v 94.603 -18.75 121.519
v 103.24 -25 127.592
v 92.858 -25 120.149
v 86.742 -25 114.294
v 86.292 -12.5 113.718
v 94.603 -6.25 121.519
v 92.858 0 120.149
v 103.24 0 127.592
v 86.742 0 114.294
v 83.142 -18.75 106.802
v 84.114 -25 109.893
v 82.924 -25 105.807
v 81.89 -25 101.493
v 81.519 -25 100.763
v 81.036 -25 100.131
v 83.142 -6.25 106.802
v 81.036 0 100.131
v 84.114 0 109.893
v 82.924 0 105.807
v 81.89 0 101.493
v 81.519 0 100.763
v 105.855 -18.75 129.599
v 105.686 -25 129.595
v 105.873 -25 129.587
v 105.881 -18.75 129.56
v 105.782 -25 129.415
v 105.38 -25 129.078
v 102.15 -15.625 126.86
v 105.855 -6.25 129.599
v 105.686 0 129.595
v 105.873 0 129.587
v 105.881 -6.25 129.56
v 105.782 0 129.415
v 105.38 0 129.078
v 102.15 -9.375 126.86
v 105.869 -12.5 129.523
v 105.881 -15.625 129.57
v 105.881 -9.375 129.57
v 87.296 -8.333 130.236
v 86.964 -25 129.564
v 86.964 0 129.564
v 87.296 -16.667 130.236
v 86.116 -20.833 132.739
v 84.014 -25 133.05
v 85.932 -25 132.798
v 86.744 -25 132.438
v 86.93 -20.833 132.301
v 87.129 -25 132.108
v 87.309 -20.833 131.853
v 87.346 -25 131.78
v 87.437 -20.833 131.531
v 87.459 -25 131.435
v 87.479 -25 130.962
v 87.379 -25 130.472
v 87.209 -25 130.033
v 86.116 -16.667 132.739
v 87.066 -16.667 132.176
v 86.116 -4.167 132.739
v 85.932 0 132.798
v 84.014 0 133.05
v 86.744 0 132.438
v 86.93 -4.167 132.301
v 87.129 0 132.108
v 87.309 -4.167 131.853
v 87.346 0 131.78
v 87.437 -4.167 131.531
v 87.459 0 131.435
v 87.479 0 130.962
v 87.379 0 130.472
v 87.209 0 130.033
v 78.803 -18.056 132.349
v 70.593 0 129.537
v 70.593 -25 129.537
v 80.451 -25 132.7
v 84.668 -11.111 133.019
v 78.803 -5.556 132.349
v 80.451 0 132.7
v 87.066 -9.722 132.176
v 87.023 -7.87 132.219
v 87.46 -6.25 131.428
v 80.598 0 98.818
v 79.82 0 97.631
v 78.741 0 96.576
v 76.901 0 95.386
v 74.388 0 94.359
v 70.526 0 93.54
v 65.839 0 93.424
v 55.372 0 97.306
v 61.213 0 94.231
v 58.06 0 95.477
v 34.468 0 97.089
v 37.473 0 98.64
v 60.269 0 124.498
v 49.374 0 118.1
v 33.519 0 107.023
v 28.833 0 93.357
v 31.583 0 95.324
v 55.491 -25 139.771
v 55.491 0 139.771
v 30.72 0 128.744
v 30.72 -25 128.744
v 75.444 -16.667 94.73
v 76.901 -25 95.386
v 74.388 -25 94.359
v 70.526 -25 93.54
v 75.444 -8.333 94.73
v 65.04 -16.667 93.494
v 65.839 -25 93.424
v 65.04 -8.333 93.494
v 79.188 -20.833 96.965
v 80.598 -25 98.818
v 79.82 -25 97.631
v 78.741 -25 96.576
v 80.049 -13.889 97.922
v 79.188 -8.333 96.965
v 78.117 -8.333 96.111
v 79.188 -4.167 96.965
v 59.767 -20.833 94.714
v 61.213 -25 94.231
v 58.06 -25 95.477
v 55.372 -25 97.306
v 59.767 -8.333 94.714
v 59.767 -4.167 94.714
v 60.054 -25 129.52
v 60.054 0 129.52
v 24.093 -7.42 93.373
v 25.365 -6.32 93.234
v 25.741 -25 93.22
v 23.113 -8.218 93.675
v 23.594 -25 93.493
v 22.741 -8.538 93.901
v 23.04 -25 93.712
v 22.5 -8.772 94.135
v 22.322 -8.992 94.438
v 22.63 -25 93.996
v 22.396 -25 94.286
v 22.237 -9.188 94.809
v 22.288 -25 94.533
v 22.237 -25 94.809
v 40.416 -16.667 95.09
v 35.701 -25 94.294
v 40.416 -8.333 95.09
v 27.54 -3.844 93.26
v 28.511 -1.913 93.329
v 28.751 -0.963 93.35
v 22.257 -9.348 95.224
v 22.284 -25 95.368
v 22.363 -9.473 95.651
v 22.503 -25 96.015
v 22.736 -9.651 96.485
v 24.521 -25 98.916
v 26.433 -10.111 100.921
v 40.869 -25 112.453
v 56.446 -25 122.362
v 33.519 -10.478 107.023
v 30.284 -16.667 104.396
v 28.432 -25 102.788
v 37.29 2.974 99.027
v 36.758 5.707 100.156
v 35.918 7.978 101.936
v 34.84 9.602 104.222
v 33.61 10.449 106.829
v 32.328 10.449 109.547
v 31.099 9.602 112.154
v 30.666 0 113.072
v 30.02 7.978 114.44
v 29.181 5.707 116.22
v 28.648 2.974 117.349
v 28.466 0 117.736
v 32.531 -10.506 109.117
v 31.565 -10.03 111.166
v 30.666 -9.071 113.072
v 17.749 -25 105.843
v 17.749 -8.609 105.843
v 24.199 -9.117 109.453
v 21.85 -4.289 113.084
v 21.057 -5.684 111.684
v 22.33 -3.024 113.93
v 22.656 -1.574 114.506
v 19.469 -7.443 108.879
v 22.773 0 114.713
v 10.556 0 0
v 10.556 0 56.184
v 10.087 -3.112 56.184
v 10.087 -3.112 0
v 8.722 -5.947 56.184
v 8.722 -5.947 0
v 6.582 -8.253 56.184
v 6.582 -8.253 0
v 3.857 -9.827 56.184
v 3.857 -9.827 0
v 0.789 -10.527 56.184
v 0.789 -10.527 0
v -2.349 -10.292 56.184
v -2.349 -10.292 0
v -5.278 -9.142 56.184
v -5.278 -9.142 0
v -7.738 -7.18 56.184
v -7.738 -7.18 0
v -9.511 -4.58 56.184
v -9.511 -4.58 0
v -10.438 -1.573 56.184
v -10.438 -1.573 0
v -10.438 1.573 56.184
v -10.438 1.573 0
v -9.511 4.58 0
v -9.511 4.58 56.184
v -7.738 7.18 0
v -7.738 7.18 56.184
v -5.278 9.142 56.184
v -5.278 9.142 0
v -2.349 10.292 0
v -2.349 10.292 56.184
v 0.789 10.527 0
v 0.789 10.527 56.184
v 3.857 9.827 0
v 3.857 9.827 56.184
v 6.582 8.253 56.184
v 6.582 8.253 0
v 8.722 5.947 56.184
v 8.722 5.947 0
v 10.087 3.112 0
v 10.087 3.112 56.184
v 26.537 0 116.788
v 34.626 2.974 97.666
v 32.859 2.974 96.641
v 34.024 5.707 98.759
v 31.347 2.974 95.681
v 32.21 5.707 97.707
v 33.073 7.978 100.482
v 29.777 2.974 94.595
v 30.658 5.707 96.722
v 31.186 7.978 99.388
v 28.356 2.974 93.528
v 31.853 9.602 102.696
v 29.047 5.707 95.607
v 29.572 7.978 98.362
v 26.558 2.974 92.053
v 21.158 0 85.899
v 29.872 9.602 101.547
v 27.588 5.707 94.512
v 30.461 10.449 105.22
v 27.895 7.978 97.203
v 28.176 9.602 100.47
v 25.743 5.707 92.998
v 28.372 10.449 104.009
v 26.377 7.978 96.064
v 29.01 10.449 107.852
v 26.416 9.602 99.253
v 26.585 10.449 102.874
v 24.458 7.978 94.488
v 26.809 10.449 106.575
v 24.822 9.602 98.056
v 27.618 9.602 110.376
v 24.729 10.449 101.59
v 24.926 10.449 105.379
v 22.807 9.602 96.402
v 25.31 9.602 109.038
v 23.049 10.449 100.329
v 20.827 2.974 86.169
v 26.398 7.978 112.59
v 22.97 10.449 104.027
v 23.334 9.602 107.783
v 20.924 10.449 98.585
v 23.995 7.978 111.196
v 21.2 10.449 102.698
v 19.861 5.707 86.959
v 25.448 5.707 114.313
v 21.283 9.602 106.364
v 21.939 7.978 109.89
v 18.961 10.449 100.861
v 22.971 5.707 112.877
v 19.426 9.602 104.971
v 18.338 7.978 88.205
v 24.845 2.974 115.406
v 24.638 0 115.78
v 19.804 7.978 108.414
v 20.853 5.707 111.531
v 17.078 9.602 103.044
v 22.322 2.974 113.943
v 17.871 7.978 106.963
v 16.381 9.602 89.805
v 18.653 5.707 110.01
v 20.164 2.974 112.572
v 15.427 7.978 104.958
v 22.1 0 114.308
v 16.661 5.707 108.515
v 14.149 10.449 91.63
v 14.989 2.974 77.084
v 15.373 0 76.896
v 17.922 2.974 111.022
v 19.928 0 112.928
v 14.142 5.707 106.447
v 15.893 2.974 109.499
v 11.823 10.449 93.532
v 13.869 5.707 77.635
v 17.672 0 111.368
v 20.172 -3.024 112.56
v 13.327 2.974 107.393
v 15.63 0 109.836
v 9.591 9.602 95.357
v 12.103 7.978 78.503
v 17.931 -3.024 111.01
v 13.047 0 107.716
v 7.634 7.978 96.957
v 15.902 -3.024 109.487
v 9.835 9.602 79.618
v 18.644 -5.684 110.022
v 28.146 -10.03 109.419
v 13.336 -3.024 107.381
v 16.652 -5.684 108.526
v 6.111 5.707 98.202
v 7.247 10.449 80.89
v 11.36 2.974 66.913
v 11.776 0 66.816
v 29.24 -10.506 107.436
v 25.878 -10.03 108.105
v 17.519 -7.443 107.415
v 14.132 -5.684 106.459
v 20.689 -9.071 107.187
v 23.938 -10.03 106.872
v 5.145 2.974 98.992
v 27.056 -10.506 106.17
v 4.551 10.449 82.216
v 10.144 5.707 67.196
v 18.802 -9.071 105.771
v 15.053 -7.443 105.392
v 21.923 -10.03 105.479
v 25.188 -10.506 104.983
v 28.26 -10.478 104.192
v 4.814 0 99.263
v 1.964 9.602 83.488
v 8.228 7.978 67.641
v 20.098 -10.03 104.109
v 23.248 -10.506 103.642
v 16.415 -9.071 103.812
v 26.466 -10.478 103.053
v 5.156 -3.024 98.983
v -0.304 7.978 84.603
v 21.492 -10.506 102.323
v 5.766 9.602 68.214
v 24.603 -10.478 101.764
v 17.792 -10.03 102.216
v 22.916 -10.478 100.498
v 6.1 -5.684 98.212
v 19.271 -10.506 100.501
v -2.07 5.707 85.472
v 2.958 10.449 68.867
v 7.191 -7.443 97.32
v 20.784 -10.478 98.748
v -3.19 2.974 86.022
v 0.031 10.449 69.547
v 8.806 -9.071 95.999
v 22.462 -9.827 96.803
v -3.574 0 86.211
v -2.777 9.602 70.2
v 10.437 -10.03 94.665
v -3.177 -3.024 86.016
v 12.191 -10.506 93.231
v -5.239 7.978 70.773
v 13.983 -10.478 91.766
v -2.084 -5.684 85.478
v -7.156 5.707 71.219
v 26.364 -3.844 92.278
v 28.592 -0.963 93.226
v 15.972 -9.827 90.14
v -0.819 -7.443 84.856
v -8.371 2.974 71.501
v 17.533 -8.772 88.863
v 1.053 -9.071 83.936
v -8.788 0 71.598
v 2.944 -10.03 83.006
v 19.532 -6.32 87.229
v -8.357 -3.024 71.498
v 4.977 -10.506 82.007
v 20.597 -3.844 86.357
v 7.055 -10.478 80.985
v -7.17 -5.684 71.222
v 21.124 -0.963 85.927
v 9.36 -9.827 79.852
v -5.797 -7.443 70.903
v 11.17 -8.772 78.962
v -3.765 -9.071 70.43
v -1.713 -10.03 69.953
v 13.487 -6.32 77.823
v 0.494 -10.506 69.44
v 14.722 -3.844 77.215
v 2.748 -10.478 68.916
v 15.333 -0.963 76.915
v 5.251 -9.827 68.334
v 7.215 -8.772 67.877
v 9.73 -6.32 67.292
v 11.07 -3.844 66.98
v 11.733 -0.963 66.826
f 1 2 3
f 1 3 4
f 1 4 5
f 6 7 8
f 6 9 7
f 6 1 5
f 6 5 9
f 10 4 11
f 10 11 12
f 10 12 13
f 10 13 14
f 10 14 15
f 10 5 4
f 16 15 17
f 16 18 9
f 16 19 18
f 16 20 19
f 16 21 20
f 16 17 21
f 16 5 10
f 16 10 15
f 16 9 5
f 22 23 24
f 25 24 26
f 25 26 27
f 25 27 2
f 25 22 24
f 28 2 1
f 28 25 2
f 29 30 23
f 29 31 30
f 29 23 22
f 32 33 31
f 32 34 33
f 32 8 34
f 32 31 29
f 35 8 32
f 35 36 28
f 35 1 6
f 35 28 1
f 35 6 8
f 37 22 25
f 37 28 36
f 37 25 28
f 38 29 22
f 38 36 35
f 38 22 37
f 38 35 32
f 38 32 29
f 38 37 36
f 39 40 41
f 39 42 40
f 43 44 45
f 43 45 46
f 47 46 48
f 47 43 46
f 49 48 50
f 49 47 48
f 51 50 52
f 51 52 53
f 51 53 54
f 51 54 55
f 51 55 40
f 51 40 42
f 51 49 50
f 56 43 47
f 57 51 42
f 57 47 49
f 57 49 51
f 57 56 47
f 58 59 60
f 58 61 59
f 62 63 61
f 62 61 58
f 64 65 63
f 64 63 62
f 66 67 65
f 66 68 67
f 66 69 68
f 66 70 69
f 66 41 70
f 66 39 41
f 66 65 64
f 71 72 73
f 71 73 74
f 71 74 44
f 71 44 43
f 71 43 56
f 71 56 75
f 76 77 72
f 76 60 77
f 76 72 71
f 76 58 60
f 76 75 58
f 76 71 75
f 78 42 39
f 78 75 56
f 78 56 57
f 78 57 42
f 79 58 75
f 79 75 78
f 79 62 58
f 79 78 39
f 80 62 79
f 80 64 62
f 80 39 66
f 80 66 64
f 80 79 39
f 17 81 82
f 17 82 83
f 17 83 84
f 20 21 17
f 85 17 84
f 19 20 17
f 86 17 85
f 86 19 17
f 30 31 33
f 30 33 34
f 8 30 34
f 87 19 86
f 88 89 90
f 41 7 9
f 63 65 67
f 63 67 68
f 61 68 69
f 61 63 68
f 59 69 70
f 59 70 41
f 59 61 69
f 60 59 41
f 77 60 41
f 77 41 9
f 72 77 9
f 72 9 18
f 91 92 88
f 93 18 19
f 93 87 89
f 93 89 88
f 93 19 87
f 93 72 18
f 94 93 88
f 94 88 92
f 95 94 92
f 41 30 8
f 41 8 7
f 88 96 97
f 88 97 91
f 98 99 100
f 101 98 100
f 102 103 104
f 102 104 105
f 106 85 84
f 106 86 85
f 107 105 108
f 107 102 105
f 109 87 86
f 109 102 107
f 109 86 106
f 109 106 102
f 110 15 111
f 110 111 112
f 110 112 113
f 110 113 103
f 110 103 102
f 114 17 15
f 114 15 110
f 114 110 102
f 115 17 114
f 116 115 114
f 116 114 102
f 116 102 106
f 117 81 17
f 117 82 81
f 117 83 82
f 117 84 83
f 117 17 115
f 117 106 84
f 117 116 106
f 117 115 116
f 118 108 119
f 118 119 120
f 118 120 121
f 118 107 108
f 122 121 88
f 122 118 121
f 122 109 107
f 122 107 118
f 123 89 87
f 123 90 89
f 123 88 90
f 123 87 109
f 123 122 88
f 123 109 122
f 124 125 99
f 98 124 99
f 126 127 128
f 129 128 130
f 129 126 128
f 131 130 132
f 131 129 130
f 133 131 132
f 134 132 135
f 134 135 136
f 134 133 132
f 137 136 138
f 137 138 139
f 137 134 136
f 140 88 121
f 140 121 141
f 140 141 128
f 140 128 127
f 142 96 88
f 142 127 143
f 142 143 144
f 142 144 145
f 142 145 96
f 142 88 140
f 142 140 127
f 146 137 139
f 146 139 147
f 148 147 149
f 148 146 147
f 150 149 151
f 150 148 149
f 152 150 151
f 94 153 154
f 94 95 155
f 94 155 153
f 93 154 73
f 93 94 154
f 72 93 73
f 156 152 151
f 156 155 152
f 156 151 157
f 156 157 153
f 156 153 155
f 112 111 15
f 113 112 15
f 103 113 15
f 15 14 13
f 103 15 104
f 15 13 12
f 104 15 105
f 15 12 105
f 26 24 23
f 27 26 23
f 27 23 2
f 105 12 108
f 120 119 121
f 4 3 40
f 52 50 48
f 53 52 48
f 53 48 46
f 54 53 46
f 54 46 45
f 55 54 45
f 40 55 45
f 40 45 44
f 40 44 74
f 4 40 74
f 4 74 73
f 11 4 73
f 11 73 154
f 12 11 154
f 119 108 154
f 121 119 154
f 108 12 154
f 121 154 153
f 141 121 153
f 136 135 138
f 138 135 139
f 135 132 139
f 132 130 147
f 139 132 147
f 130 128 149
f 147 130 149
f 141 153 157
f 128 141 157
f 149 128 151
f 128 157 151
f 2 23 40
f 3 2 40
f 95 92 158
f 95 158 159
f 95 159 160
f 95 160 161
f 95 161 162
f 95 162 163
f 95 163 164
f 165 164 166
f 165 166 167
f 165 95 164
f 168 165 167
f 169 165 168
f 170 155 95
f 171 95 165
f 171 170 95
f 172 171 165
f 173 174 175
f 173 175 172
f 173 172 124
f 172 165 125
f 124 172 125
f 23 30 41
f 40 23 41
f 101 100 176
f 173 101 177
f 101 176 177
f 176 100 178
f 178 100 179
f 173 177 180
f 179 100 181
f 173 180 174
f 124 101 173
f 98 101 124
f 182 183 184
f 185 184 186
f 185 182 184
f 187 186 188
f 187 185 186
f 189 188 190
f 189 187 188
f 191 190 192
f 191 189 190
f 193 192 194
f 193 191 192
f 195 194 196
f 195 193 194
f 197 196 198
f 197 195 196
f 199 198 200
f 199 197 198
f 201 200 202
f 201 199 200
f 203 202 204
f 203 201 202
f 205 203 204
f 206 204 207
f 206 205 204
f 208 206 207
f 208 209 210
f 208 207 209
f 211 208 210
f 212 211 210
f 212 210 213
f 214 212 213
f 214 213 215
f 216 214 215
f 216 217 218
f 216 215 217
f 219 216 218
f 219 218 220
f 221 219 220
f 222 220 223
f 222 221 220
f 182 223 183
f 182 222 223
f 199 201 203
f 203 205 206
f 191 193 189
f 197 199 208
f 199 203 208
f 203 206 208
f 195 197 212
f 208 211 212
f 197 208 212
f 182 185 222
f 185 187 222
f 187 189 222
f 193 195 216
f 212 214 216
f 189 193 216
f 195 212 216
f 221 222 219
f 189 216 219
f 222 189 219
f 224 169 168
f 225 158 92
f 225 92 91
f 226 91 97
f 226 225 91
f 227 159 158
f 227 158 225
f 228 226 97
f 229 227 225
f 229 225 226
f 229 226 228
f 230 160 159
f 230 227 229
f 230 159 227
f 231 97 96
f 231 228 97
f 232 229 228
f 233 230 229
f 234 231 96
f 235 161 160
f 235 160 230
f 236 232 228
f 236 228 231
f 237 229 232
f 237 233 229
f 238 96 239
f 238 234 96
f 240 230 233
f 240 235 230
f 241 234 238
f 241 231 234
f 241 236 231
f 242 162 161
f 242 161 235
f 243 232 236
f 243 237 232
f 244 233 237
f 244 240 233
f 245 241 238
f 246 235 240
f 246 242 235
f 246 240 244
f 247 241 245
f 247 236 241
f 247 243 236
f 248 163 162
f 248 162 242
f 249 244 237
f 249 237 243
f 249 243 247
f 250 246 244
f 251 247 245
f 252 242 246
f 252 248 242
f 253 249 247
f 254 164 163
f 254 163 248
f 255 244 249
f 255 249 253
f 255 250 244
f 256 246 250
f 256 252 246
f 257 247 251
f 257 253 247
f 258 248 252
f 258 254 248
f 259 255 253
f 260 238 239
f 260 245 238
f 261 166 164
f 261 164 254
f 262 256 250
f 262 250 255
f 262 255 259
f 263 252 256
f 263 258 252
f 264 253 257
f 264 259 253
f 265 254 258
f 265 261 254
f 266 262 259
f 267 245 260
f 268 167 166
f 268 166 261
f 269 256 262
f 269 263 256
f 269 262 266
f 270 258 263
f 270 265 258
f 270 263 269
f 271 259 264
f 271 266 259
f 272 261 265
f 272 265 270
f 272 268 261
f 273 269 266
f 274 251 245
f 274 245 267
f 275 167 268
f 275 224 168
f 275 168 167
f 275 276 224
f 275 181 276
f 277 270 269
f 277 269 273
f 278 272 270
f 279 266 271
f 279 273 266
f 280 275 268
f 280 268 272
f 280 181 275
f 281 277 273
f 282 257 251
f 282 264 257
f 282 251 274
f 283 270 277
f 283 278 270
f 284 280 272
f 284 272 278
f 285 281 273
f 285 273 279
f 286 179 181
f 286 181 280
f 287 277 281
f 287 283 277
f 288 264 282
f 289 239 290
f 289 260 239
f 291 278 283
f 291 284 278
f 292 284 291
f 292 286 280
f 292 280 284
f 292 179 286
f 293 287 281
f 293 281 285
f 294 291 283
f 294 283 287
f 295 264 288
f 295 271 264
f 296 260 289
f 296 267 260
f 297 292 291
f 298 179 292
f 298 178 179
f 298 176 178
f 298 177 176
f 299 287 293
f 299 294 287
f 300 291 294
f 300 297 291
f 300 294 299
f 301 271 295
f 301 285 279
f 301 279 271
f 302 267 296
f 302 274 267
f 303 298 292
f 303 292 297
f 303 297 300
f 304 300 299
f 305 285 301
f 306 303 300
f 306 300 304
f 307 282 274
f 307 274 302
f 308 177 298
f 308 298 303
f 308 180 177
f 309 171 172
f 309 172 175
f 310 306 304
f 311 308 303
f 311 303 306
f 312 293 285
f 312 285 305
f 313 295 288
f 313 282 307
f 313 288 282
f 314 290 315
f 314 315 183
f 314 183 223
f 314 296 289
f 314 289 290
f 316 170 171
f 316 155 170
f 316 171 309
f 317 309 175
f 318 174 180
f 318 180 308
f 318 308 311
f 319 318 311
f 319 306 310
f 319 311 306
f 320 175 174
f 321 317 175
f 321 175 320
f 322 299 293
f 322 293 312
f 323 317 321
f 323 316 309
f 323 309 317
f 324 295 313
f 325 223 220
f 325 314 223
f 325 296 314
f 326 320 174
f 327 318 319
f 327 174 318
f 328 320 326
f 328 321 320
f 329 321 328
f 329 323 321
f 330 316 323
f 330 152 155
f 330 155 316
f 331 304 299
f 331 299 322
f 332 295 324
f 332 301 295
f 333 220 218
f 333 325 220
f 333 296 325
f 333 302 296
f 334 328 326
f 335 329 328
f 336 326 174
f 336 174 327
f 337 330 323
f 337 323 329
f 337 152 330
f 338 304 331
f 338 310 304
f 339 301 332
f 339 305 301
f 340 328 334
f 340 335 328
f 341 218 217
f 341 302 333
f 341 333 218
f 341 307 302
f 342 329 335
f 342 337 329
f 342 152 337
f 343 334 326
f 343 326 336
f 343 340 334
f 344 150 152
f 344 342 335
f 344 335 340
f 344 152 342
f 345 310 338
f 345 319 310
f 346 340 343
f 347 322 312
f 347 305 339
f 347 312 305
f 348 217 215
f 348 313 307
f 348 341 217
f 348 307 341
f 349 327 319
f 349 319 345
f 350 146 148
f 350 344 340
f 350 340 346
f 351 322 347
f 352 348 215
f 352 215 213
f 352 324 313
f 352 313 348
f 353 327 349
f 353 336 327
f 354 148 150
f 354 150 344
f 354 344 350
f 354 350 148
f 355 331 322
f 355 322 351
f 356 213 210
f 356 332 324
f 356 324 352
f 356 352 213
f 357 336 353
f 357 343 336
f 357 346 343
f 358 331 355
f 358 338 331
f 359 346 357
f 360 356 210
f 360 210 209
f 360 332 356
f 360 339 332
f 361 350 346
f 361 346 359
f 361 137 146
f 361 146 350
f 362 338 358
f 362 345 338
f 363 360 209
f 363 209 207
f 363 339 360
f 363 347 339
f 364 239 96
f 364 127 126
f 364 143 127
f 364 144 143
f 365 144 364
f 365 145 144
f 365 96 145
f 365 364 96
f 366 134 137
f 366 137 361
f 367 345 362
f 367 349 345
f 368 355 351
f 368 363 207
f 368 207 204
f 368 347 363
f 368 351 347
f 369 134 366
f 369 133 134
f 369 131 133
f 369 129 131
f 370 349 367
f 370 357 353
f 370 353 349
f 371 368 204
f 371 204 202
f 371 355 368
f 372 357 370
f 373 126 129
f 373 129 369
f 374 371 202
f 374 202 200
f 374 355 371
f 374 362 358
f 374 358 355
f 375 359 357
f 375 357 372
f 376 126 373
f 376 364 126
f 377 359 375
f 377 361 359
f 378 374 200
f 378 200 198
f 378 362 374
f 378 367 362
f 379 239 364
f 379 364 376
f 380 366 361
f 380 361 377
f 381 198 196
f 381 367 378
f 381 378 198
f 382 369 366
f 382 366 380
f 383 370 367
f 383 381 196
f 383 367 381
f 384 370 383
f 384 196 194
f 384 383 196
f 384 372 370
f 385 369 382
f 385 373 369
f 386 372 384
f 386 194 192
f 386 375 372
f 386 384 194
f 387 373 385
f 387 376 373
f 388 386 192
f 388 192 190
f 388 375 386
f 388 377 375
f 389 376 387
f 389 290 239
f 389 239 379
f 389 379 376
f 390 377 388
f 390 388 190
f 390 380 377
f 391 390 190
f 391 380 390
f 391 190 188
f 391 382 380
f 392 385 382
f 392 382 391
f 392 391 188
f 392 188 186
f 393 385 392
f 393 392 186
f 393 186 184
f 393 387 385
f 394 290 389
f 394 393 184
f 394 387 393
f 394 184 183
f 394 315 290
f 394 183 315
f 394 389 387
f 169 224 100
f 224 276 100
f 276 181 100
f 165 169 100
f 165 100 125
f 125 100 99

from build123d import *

# Parameters (mm, degrees)
F0_R     = 10.5563944733
F4_DEPTH = 17.4
F5_DEPTH = 25


with BuildPart() as f2:
    # F2: sweep along a path in F1
    with BuildLine(Plane.XZ) as f2_path:
        ThreePointArc((32.9693630338, 108.1880107522), (8.9368583588, 86.9712584307), (0, 56.1841763556))
        Line((0, 56.1841763556), (0, 0))
    # F0 (on Top) → F2 (sweep)
    with BuildSketch(Plane.XY):
        Circle(F0_R)
    sweep(path=f2_path.line)

    # F3 (on Front) → F4 (join)
    with BuildSketch(Plane.XZ):
        Polygon((30.7201836258, 128.7439912558), (17.7488774061, 105.8425977826), (60.0541557765, 129.5203427714), (55.4911866784, 139.7707760334), align=None)
    extrude(amount=F4_DEPTH)

    # F3 (on Front) → F5 (join)
    with BuildSketch(Plane.XZ):
        with BuildLine():
            add(Edge.make_bspline(
                [(70.5931460322, 129.5374848512), (72.0787961892, 130.1669103611), (82.3390802937, 134.1470108941), (88.9364784602, 133.4779202279), (87.0999080955, 129.7982594332), (86.9636833649, 129.5641121704)],
                knots=[0.1842071124, 0.1842071124, 0.1842071124, 0.1842071124, 0.1983505917, 0.2859572834, 0.2916534606, 0.2916534606, 0.2916534606, 0.2916534606], degree=3))
            Line((70.5931460322, 129.5374848512), (86.9636833649, 129.5641121704))
        make_face()
        with BuildLine():
            Line((86.9636833649, 129.5641121704), (70.5931460322, 129.5374848512))
            add(Edge.make_bspline(
                [(22.2367271781, 94.8094055057), (21.8099809815, 100.2190570595), (51.2437823198, 121.3397385227), (70.5931460322, 129.5374848512)],
                knots=[0, 0, 0, 0, 0.1842071124, 0.1842071124, 0.1842071124, 0.1842071124], degree=3))
            add(Edge.make_bspline(
                [(55.3720220923, 97.3064601421), (40.8845983612, 95.8756546572), (22.5679207065, 90.6110281103), (22.2367271781, 94.8094055057)],
                knots=[0.8570386708, 0.8570386708, 0.8570386708, 0.8570386708, 1, 1, 1, 1], degree=3))
            add(Edge.make_bspline(
                [(55.3720220923, 97.3064601421), (48.5019136195, 103.4207659246), (49.6477059157, 117.0994626913), (56.8694397807, 119.2096248269)],
                knots=[0.6940672743, 0.6940672743, 0.6940672743, 0.6940672743, 1, 1, 1, 1], degree=3))
            add(Edge.make_bspline(
                [(56.8694397807, 119.2096248269), (65.42174317, 121.7085741266), (82.4951694142, 107.9833870142), (81.0358300805, 100.1313924789)],
                knots=[0, 0, 0, 0, 0.3622993503, 0.3622993503, 0.3622993503, 0.3622993503], degree=3))
            add(Edge.make_bspline(
                [(105.6858077645, 129.5945644379), (107.8117109305, 129.9769098437), (80.0096882515, 114.8143425622), (83.3633906013, 102.5962098802), (81.0358300805, 100.1313924789)],
                knots=[0.512204989, 0.512204989, 0.512204989, 0.512204989, 0.6363641255, 0.7310224434, 0.7310224434, 0.7310224434, 0.7310224434], degree=3))
            add(Edge.make_bspline(
                [(86.9636833649, 129.5641121704), (84.8863296268, 125.9934925799), (65.3812215141, 111.3167629429), (103.3967493158, 129.1828754223), (105.6858077645, 129.5945644379)],
                knots=[0.2916534606, 0.2916534606, 0.2916534606, 0.2916534606, 0.3785170935, 0.512204989, 0.512204989, 0.512204989, 0.512204989], degree=3))
        make_face()
        Polygon((30.7201836258, 128.7439912558), (17.7488774061, 105.8425977826), (60.0541557765, 129.5203427714), (55.4911866784, 139.7707760334), align=None)
        with BuildLine():
            Line((105.6858077645, 129.5945644379), (86.9636833649, 129.5641121704))
            add(Edge.make_bspline(
                [(86.9636833649, 129.5641121704), (84.8863296268, 125.9934925799), (65.3812215141, 111.3167629429), (103.3967493158, 129.1828754223), (105.6858077645, 129.5945644379)],
                knots=[0.2916534606, 0.2916534606, 0.2916534606, 0.2916534606, 0.3785170935, 0.512204989, 0.512204989, 0.512204989, 0.512204989], degree=3))
        make_face()
        with BuildLine():
            add(Edge.make_bspline(
                [(55.3720220923, 97.3064601421), (48.5019136195, 103.4207659246), (49.6477059157, 117.0994626913), (56.8694397807, 119.2096248269)],
                knots=[0.6940672743, 0.6940672743, 0.6940672743, 0.6940672743, 1, 1, 1, 1], degree=3))
            add(Edge.make_bspline(
                [(81.0358300805, 100.1313924789), (77.9372075592, 96.8500433402), (68.1422620706, 98.567673298), (55.3720220923, 97.3064601421)],
                knots=[0.7310224434, 0.7310224434, 0.7310224434, 0.7310224434, 0.8570386708, 0.8570386708, 0.8570386708, 0.8570386708], degree=3))
            add(Edge.make_bspline(
                [(56.8694397807, 119.2096248269), (65.42174317, 121.7085741266), (82.4951694142, 107.9833870142), (81.0358300805, 100.1313924789)],
                knots=[0, 0, 0, 0, 0.3622993503, 0.3622993503, 0.3622993503, 0.3622993503], degree=3))
        make_face()
        with BuildLine():
            add(Edge.make_bspline(
                [(81.0358300805, 100.1313924789), (77.9372075592, 96.8500433402), (68.1422620706, 98.567673298), (55.3720220923, 97.3064601421)],
                knots=[0.7310224434, 0.7310224434, 0.7310224434, 0.7310224434, 0.8570386708, 0.8570386708, 0.8570386708, 0.8570386708], degree=3))
            add(Edge.make_bspline(
                [(81.0358300805, 100.1313924789), (79.6994711252, 92.941095492), (62.8222928035, 90.6758176319), (55.3720220923, 97.3064601421)],
                knots=[0.3622993503, 0.3622993503, 0.3622993503, 0.3622993503, 0.6940672743, 0.6940672743, 0.6940672743, 0.6940672743], degree=3))
        make_face()
    extrude(amount=F5_DEPTH)


solid = f2.part
